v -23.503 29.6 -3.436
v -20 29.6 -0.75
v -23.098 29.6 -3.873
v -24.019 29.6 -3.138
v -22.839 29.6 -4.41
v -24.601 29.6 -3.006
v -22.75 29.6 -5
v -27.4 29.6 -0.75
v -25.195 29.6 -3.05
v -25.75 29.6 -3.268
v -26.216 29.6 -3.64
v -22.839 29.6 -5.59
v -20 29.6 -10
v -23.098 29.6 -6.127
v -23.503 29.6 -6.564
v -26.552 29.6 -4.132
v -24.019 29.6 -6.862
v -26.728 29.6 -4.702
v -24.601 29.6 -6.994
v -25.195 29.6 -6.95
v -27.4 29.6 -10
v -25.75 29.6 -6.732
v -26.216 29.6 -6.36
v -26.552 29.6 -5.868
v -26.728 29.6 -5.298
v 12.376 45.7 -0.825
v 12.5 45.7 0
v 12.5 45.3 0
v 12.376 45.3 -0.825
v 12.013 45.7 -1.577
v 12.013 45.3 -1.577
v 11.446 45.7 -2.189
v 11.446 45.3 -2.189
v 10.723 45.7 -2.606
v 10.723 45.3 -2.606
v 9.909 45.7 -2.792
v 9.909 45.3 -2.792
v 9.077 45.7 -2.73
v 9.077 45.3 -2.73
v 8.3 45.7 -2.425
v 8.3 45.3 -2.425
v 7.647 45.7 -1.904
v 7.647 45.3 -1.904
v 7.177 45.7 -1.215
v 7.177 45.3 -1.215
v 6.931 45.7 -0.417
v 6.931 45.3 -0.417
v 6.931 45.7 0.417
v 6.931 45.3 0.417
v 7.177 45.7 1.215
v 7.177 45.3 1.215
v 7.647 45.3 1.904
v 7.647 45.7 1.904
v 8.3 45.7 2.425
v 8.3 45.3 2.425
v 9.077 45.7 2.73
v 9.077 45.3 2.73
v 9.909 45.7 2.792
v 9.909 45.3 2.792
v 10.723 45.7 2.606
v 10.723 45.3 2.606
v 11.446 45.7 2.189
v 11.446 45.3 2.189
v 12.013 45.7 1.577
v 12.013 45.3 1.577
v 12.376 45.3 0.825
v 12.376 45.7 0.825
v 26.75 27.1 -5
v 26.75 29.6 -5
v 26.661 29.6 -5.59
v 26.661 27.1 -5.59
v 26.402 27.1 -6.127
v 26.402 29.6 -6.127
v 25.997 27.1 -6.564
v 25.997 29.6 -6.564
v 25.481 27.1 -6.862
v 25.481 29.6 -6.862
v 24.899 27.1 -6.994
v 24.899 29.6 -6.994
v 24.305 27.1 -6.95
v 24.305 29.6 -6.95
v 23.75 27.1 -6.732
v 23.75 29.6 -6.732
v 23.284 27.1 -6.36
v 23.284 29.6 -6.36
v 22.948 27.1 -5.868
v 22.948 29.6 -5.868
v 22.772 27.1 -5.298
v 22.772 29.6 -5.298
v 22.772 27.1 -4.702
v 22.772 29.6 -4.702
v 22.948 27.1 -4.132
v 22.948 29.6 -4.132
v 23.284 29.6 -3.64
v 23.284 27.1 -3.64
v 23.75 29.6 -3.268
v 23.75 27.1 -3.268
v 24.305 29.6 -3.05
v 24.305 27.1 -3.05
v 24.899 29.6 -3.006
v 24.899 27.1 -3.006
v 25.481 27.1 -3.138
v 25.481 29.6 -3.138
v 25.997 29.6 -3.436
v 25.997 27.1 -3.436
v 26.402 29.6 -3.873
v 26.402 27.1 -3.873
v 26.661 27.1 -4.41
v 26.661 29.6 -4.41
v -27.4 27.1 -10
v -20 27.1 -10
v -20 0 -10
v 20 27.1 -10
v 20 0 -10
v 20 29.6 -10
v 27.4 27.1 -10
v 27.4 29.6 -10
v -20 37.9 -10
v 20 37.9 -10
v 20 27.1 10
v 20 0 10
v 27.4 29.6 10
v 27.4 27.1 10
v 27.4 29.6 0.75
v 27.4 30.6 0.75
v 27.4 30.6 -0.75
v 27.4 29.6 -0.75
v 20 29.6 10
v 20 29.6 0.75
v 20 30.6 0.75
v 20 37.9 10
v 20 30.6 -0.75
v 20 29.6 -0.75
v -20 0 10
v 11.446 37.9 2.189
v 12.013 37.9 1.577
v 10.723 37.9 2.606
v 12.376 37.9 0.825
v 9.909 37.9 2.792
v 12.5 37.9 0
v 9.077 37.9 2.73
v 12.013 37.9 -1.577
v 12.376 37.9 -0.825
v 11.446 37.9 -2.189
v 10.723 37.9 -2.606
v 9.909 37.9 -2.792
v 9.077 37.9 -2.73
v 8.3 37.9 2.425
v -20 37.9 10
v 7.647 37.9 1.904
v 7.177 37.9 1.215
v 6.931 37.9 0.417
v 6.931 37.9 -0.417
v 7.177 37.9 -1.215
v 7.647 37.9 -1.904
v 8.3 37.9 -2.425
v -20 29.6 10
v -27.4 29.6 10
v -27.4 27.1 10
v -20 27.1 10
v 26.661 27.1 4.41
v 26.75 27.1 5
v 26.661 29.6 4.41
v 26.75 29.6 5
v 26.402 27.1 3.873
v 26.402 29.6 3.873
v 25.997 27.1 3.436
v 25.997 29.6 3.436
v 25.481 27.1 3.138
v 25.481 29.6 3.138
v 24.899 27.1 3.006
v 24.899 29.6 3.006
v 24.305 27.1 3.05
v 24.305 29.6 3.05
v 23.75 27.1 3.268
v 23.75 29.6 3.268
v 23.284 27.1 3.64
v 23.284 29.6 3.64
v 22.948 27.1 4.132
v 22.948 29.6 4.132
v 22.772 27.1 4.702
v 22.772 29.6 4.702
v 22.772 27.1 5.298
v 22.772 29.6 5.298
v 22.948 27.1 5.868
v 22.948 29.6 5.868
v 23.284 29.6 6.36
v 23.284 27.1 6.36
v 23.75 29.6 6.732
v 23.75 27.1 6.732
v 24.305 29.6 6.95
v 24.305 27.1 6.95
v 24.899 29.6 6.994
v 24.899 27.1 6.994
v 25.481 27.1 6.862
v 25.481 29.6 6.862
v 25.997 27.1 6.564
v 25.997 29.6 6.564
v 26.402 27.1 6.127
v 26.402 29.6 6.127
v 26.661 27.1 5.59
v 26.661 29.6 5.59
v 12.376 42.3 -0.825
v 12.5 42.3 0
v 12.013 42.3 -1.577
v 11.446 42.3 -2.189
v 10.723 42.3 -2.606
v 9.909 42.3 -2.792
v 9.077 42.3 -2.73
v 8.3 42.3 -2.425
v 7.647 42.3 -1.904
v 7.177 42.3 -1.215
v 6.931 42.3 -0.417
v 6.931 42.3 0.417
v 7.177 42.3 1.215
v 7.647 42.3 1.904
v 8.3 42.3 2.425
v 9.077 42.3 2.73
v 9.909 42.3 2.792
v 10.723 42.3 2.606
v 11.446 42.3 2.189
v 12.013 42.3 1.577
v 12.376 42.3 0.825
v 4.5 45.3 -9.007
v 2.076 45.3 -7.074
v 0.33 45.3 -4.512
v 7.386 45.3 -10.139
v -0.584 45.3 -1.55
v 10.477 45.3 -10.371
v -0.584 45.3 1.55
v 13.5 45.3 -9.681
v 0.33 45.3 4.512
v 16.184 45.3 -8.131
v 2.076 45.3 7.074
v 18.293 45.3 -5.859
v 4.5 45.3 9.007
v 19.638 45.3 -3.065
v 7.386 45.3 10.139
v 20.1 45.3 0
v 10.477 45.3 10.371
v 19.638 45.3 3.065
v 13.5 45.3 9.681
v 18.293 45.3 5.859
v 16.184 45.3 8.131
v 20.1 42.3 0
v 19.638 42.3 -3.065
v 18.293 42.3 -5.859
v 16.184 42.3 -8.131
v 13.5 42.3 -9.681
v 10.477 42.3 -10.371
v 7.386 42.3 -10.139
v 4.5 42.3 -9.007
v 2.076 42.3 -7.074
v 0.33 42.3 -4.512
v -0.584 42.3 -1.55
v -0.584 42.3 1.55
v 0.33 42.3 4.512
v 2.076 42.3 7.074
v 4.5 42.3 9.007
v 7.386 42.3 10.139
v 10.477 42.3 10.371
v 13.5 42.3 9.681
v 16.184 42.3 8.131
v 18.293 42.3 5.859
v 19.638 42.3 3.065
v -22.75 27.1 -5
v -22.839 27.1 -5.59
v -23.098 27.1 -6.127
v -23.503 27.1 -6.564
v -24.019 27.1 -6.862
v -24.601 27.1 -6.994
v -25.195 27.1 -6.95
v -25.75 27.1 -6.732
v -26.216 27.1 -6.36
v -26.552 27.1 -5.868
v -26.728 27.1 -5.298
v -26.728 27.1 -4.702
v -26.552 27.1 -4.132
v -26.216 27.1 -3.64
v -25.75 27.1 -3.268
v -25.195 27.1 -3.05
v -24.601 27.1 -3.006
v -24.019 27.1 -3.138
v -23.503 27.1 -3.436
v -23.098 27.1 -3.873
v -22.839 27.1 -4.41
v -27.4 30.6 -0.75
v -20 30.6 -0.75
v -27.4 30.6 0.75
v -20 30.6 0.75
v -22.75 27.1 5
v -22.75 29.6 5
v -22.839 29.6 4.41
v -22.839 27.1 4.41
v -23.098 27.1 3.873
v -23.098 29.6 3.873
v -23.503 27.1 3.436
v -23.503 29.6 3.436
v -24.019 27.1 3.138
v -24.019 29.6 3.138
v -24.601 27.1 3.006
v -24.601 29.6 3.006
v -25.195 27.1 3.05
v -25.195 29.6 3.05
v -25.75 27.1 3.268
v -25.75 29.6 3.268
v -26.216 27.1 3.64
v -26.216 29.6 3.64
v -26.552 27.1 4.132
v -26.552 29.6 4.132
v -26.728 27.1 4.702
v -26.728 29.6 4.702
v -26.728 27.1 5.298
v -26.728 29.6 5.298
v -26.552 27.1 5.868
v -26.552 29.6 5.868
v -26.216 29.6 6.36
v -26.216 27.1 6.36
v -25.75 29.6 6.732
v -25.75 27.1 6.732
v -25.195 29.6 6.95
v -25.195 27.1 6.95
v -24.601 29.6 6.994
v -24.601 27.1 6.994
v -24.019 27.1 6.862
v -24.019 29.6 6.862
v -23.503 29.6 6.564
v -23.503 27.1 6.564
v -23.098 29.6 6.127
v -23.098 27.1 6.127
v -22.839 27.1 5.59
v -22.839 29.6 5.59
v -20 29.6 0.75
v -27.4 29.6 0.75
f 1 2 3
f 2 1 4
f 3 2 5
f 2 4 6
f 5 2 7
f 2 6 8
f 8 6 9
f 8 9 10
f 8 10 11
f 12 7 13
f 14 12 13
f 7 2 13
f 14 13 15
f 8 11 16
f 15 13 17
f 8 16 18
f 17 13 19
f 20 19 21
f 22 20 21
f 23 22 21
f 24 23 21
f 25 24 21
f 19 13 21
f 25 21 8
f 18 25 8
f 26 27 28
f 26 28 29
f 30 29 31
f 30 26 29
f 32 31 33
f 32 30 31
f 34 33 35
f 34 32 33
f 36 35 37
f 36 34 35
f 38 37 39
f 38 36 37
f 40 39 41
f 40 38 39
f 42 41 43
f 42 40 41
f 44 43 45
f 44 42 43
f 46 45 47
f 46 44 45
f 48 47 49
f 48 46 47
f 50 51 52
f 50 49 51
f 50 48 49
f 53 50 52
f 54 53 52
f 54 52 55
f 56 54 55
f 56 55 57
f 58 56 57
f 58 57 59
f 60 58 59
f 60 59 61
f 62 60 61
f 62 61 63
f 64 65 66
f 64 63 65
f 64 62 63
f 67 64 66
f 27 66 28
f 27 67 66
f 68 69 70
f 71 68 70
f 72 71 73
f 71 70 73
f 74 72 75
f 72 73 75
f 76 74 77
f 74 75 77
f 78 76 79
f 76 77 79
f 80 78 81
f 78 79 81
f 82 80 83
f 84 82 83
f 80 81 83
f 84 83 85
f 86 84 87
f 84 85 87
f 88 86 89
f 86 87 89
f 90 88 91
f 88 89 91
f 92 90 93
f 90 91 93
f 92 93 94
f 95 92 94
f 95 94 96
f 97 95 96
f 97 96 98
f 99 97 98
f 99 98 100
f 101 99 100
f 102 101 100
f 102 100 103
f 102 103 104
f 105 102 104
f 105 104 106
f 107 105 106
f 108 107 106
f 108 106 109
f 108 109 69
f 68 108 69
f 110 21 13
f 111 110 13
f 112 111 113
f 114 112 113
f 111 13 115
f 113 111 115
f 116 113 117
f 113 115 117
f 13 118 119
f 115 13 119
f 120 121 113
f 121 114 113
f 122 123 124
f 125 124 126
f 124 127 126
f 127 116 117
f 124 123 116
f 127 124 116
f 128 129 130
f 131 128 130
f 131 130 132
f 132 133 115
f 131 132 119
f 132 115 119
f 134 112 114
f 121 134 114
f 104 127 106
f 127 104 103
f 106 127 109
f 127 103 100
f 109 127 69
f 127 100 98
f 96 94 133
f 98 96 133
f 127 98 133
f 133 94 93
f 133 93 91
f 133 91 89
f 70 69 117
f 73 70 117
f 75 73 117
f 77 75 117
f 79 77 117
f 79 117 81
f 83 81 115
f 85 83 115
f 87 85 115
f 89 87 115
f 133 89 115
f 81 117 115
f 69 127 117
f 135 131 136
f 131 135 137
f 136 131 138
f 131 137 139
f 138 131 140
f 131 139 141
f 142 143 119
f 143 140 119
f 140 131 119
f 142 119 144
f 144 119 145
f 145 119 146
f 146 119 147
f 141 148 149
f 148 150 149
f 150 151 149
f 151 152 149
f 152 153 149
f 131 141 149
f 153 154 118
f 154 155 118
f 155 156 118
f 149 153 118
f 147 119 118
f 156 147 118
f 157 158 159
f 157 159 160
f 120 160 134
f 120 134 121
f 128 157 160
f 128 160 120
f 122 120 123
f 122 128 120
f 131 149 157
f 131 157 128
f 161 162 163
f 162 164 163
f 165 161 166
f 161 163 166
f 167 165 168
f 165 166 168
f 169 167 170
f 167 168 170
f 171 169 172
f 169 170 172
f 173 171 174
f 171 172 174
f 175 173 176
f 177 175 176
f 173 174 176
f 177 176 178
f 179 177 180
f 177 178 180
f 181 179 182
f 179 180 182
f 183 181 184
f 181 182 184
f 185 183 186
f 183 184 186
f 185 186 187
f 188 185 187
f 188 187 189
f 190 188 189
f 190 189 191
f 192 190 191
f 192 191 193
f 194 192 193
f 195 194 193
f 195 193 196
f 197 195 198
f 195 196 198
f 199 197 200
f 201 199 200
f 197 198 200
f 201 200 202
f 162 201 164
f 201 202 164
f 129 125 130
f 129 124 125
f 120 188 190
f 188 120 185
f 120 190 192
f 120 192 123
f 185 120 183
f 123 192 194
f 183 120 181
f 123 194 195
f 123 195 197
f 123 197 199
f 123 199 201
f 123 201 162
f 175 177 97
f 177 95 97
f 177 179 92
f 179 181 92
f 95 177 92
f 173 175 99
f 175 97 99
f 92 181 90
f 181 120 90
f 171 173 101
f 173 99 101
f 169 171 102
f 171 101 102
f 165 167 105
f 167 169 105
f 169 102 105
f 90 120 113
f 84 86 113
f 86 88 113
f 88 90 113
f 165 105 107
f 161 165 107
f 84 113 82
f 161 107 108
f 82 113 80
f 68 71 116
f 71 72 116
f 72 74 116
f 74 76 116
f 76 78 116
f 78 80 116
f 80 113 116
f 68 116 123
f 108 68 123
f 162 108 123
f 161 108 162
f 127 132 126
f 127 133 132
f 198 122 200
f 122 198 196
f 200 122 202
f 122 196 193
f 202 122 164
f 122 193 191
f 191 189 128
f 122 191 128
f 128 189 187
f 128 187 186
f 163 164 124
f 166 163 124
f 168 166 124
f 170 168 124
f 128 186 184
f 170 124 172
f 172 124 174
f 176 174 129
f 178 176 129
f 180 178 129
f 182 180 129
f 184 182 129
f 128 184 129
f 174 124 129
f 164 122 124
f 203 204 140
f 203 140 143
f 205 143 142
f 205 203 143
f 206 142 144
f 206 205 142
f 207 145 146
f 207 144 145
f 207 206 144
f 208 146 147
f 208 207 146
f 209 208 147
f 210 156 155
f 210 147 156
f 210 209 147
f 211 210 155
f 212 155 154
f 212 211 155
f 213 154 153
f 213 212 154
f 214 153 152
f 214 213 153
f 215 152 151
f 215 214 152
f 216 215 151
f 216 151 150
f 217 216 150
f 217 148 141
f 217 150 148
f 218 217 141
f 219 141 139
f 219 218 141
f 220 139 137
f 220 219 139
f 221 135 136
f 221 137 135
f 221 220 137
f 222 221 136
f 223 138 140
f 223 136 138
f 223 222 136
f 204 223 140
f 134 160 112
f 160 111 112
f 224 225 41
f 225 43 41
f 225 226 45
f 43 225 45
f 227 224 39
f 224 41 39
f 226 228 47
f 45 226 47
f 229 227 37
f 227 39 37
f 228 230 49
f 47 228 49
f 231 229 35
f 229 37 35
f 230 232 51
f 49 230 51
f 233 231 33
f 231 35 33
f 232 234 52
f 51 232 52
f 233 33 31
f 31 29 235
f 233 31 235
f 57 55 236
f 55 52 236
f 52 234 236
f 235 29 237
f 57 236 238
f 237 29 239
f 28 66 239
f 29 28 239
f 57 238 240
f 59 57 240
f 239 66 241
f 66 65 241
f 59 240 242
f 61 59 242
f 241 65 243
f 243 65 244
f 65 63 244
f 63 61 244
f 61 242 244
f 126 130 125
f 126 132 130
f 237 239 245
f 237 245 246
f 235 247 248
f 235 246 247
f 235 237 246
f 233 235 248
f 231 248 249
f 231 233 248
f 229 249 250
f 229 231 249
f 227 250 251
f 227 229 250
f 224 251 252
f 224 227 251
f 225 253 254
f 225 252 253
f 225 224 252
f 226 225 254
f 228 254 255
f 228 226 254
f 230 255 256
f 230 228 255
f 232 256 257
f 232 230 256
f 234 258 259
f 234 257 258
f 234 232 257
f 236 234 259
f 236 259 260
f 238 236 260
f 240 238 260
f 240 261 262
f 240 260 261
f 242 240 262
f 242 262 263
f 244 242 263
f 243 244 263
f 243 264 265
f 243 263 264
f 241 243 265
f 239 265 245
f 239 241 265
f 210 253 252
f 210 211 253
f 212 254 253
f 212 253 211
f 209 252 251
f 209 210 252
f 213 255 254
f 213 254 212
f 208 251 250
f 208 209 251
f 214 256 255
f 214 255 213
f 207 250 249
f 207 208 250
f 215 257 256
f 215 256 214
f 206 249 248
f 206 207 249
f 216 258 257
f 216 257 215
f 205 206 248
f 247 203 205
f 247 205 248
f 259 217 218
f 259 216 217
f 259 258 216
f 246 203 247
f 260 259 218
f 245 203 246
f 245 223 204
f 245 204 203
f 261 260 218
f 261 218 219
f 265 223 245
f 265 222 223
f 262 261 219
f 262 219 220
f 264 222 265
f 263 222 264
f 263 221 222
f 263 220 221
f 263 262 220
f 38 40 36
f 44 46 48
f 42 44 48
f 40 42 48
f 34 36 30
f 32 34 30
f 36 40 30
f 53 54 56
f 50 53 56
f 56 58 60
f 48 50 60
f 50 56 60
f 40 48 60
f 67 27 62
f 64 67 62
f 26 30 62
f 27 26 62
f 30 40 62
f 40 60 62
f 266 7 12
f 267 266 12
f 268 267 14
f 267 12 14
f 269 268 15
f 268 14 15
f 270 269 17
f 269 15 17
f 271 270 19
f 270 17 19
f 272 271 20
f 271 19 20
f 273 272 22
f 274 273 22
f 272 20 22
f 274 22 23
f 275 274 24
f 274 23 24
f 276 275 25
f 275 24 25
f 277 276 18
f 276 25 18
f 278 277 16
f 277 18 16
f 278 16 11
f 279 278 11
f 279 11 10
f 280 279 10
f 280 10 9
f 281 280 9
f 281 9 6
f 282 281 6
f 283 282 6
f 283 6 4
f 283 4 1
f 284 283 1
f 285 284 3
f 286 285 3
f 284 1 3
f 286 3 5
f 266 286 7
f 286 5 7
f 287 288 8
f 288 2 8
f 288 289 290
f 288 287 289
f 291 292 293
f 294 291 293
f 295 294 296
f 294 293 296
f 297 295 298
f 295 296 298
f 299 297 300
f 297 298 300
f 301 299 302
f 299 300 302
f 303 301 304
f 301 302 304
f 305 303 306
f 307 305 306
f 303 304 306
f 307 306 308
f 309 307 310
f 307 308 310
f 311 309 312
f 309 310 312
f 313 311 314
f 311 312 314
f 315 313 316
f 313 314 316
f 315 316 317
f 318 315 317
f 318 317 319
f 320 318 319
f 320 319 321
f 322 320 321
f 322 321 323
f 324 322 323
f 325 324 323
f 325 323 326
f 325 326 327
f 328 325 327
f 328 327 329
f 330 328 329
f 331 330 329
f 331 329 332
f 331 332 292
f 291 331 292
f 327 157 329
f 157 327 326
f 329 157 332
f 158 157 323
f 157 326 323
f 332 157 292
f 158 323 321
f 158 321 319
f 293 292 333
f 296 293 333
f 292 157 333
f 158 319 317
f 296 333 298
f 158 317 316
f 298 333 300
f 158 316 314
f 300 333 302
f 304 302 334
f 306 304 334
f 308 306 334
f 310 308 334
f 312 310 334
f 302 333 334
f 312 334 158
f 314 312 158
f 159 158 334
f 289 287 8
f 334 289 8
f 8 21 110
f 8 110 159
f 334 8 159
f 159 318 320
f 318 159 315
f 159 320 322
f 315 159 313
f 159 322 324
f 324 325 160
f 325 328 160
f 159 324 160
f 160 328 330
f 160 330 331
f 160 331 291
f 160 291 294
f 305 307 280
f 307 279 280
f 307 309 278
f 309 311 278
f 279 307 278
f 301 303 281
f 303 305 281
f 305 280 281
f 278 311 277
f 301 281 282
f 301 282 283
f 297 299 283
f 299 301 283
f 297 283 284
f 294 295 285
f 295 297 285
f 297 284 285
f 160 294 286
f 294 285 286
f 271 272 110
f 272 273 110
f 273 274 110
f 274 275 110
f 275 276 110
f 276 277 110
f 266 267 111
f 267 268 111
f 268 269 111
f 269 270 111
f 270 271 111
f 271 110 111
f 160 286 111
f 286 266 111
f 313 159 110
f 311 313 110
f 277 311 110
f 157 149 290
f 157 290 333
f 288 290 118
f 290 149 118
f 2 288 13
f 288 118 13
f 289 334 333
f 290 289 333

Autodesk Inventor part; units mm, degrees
ref_plane "YZ Plane" through (0, 0, 0) normal (1, 0, 0) x (0, 1, 0)
ref_plane "XZ Plane" through (0, 0, 0) normal (0, 1, 0) x (-1, 0, 0)
ref_plane "XY Plane" through (0, 0, 0) normal (0, 0, 1) x (1, 0, 0)
sketch "Sketch1" plane through (0, 0, 0) normal (0, 0, 1) x (1, 0, 0)
  line L0 (-20, 0) -> (20, 0)
  line L1 (20, 0) -> (20, 27.1)
  line L2 (20, 27.1) -> (27.4, 27.1)
  line L3 (27.4, 27.1) -> (27.4, 29.6)
  line L4 (27.4, 29.6) -> (20, 29.6)
  line L5 (20, 29.6) -> (20, 37.9)
  line L6 (20, 37.9) -> (-20, 37.9)
  line L7 (-20, 37.9) -> (-20, 29.6)
  line L8 (-20, 29.6) -> (-27.4, 29.6)
  line L9 (-27.4, 29.6) -> (-27.4, 27.1)
  line L10 (-27.4, 27.1) -> (-20, 27.1)
  line L11 (-20, 27.1) -> (-20, 0)
  point P0 (0, 0)
  point P1 (0, 0)
  dimension "d0" = 40
  dimension "d1" = 27.1
  dimension "d2" = 7.4
  dimension "d3" = 2.5
  dimension "d4" = 8.3
  dimension "d5" = 7.4
extrude "Extrusion1" add sketch "Sketch1" along normal mid plane 20
sketch "Sketch4" plane through (0, 0, 0) normal (0, 0, 1) x (1, 0, 0)
  line L0 (20, 37.9) -> (-20, 37.9) projected
  line L1 (12.5, 37.9) -> (12.5, 42.3)
  line L2 (12.5, 42.3) -> (20.1, 42.3)
  line L3 (20.1, 42.3) -> (20.1, 45.3)
  line L4 (20.1, 45.3) -> (12.5, 45.3)
  line L5 (12.5, 45.3) -> (12.5, 45.7)
  line L6 (12.5, 45.7) -> (9.7, 45.7)
  line L7 (12.5, 37.9) -> (9.7, 37.9)
  line L8 (9.7, 45.7) -> (9.7, 37.9)
  point P0 (0, 0)
  point P1 (0, 37.9)
  dimension "d10" = 9.7
  dimension "d11" = 0.4
  dimension "d12" = 10.4
  dimension "d13" = 2.8
  dimension "d14" = 4.4
  dimension "d15" = 3
revolve "Revolution1" add sketch "Sketch4" angle 360 about axis through (9.7, 45.7, 0) along (0, -1, 0)
sketch "Sketch5" plane through (-27.4, 29.6, 10) normal (0, 1, 0) x (1, 0, 0)
  circle A0 centre (2.65, 15) radius 2
  line L0 (0, 20) -> (0, 0) projected
  line L1 (7.4, 0) -> (0, 0) projected
  line L2 (7.4, 20) -> (7.4, 0) projected
  line L3 (0, 20) -> (7.4, 20) projected
  line L4 (47.4, 20) -> (47.4, 0) projected
  line L5 (54.8, 0) -> (47.4, 0) projected
  line L6 (54.8, 20) -> (54.8, 0) projected
  line L7 (47.4, 20) -> (54.8, 20) projected
  line L8 (7.4, 20) -> (47.4, 20) projected
  line L9 (27.4, 20) -> (27.4, 0) construction
  line L10 (7.4, 0) -> (47.4, 0) projected
  line L11 (0, 20) -> (0, 0) projected
  line L12 (0, 10) -> (54.8, 10) construction
  line L13 (54.8, 20) -> (54.8, 0) projected
  circle A1 centre (2.65, 5) radius 2
  circle A2 centre (52.15, 15) radius 2
  circle A3 centre (52.15, 5) radius 2
  line L14 (7.4, 0) -> (7.4, 20) projected
  line L15 (7.4, 10.75) -> (0, 10.75)
  line L16 (0, 10.75) -> (0, 9.25)
  line L17 (0, 9.25) -> (7.4, 9.25)
  line L18 (7.4, 9.25) -> (7.4, 10.75)
  line L19 (47.4, 10.75) -> (54.8, 10.75)
  line L20 (54.8, 10.75) -> (54.8, 9.25)
  line L21 (54.8, 9.25) -> (47.4, 9.25)
  line L22 (47.4, 9.25) -> (47.4, 10.75)
  point P0 (27.4, 10)
  dimension "d17" = 4
  dimension "d18" = 10
  dimension "d19" = 49.5
  dimension "d22" = 7.4
  dimension "d23" = 1.5
extrude "Extrusion2" cut sketch "Sketch5" against normal up to next contours A0 | A1 | A2 | A3
extrude "Extrusion3" add sketch "Sketch5" along normal blind 1 contours L15 L2 L17 L0 | L19 L6 L21 L4
sketch "Sketch6" plane through (-20, 0, 10) normal (0, -1, 0) x (1, 0, 0)
  line L0 (0, 0) -> (0, -20) construction
  line L1 (0, -10) -> (40, -10) construction
  line L2 (40, -20) -> (40, 0) construction
  line L3 (40, 0) -> (0, 0) construction
  line L4 (20, 0) -> (20, -20) construction
  line L5 (0, -20) -> (40, -20) construction
  line L6 (40, 0) -> (0, 0) construction
  line L7 (0, 0) -> (0, -20) construction
  line L8 (0, -20) -> (40, -20) construction
  line L9 (40, -20) -> (40, 0) construction
  circle A0 centre (29.7, -10) radius 2.8 projected
  circle A1 centre (-4.75, -5) radius 2 projected
  circle A2 centre (-4.75, -15) radius 2 projected
  circle A3 centre (44.75, -15) radius 2 projected
  circle A4 centre (44.75, -5) radius 2 projected
  point P0 (20, -10)
  point P1 (29.7, -10)
properties part number "FS5106B_servo"
